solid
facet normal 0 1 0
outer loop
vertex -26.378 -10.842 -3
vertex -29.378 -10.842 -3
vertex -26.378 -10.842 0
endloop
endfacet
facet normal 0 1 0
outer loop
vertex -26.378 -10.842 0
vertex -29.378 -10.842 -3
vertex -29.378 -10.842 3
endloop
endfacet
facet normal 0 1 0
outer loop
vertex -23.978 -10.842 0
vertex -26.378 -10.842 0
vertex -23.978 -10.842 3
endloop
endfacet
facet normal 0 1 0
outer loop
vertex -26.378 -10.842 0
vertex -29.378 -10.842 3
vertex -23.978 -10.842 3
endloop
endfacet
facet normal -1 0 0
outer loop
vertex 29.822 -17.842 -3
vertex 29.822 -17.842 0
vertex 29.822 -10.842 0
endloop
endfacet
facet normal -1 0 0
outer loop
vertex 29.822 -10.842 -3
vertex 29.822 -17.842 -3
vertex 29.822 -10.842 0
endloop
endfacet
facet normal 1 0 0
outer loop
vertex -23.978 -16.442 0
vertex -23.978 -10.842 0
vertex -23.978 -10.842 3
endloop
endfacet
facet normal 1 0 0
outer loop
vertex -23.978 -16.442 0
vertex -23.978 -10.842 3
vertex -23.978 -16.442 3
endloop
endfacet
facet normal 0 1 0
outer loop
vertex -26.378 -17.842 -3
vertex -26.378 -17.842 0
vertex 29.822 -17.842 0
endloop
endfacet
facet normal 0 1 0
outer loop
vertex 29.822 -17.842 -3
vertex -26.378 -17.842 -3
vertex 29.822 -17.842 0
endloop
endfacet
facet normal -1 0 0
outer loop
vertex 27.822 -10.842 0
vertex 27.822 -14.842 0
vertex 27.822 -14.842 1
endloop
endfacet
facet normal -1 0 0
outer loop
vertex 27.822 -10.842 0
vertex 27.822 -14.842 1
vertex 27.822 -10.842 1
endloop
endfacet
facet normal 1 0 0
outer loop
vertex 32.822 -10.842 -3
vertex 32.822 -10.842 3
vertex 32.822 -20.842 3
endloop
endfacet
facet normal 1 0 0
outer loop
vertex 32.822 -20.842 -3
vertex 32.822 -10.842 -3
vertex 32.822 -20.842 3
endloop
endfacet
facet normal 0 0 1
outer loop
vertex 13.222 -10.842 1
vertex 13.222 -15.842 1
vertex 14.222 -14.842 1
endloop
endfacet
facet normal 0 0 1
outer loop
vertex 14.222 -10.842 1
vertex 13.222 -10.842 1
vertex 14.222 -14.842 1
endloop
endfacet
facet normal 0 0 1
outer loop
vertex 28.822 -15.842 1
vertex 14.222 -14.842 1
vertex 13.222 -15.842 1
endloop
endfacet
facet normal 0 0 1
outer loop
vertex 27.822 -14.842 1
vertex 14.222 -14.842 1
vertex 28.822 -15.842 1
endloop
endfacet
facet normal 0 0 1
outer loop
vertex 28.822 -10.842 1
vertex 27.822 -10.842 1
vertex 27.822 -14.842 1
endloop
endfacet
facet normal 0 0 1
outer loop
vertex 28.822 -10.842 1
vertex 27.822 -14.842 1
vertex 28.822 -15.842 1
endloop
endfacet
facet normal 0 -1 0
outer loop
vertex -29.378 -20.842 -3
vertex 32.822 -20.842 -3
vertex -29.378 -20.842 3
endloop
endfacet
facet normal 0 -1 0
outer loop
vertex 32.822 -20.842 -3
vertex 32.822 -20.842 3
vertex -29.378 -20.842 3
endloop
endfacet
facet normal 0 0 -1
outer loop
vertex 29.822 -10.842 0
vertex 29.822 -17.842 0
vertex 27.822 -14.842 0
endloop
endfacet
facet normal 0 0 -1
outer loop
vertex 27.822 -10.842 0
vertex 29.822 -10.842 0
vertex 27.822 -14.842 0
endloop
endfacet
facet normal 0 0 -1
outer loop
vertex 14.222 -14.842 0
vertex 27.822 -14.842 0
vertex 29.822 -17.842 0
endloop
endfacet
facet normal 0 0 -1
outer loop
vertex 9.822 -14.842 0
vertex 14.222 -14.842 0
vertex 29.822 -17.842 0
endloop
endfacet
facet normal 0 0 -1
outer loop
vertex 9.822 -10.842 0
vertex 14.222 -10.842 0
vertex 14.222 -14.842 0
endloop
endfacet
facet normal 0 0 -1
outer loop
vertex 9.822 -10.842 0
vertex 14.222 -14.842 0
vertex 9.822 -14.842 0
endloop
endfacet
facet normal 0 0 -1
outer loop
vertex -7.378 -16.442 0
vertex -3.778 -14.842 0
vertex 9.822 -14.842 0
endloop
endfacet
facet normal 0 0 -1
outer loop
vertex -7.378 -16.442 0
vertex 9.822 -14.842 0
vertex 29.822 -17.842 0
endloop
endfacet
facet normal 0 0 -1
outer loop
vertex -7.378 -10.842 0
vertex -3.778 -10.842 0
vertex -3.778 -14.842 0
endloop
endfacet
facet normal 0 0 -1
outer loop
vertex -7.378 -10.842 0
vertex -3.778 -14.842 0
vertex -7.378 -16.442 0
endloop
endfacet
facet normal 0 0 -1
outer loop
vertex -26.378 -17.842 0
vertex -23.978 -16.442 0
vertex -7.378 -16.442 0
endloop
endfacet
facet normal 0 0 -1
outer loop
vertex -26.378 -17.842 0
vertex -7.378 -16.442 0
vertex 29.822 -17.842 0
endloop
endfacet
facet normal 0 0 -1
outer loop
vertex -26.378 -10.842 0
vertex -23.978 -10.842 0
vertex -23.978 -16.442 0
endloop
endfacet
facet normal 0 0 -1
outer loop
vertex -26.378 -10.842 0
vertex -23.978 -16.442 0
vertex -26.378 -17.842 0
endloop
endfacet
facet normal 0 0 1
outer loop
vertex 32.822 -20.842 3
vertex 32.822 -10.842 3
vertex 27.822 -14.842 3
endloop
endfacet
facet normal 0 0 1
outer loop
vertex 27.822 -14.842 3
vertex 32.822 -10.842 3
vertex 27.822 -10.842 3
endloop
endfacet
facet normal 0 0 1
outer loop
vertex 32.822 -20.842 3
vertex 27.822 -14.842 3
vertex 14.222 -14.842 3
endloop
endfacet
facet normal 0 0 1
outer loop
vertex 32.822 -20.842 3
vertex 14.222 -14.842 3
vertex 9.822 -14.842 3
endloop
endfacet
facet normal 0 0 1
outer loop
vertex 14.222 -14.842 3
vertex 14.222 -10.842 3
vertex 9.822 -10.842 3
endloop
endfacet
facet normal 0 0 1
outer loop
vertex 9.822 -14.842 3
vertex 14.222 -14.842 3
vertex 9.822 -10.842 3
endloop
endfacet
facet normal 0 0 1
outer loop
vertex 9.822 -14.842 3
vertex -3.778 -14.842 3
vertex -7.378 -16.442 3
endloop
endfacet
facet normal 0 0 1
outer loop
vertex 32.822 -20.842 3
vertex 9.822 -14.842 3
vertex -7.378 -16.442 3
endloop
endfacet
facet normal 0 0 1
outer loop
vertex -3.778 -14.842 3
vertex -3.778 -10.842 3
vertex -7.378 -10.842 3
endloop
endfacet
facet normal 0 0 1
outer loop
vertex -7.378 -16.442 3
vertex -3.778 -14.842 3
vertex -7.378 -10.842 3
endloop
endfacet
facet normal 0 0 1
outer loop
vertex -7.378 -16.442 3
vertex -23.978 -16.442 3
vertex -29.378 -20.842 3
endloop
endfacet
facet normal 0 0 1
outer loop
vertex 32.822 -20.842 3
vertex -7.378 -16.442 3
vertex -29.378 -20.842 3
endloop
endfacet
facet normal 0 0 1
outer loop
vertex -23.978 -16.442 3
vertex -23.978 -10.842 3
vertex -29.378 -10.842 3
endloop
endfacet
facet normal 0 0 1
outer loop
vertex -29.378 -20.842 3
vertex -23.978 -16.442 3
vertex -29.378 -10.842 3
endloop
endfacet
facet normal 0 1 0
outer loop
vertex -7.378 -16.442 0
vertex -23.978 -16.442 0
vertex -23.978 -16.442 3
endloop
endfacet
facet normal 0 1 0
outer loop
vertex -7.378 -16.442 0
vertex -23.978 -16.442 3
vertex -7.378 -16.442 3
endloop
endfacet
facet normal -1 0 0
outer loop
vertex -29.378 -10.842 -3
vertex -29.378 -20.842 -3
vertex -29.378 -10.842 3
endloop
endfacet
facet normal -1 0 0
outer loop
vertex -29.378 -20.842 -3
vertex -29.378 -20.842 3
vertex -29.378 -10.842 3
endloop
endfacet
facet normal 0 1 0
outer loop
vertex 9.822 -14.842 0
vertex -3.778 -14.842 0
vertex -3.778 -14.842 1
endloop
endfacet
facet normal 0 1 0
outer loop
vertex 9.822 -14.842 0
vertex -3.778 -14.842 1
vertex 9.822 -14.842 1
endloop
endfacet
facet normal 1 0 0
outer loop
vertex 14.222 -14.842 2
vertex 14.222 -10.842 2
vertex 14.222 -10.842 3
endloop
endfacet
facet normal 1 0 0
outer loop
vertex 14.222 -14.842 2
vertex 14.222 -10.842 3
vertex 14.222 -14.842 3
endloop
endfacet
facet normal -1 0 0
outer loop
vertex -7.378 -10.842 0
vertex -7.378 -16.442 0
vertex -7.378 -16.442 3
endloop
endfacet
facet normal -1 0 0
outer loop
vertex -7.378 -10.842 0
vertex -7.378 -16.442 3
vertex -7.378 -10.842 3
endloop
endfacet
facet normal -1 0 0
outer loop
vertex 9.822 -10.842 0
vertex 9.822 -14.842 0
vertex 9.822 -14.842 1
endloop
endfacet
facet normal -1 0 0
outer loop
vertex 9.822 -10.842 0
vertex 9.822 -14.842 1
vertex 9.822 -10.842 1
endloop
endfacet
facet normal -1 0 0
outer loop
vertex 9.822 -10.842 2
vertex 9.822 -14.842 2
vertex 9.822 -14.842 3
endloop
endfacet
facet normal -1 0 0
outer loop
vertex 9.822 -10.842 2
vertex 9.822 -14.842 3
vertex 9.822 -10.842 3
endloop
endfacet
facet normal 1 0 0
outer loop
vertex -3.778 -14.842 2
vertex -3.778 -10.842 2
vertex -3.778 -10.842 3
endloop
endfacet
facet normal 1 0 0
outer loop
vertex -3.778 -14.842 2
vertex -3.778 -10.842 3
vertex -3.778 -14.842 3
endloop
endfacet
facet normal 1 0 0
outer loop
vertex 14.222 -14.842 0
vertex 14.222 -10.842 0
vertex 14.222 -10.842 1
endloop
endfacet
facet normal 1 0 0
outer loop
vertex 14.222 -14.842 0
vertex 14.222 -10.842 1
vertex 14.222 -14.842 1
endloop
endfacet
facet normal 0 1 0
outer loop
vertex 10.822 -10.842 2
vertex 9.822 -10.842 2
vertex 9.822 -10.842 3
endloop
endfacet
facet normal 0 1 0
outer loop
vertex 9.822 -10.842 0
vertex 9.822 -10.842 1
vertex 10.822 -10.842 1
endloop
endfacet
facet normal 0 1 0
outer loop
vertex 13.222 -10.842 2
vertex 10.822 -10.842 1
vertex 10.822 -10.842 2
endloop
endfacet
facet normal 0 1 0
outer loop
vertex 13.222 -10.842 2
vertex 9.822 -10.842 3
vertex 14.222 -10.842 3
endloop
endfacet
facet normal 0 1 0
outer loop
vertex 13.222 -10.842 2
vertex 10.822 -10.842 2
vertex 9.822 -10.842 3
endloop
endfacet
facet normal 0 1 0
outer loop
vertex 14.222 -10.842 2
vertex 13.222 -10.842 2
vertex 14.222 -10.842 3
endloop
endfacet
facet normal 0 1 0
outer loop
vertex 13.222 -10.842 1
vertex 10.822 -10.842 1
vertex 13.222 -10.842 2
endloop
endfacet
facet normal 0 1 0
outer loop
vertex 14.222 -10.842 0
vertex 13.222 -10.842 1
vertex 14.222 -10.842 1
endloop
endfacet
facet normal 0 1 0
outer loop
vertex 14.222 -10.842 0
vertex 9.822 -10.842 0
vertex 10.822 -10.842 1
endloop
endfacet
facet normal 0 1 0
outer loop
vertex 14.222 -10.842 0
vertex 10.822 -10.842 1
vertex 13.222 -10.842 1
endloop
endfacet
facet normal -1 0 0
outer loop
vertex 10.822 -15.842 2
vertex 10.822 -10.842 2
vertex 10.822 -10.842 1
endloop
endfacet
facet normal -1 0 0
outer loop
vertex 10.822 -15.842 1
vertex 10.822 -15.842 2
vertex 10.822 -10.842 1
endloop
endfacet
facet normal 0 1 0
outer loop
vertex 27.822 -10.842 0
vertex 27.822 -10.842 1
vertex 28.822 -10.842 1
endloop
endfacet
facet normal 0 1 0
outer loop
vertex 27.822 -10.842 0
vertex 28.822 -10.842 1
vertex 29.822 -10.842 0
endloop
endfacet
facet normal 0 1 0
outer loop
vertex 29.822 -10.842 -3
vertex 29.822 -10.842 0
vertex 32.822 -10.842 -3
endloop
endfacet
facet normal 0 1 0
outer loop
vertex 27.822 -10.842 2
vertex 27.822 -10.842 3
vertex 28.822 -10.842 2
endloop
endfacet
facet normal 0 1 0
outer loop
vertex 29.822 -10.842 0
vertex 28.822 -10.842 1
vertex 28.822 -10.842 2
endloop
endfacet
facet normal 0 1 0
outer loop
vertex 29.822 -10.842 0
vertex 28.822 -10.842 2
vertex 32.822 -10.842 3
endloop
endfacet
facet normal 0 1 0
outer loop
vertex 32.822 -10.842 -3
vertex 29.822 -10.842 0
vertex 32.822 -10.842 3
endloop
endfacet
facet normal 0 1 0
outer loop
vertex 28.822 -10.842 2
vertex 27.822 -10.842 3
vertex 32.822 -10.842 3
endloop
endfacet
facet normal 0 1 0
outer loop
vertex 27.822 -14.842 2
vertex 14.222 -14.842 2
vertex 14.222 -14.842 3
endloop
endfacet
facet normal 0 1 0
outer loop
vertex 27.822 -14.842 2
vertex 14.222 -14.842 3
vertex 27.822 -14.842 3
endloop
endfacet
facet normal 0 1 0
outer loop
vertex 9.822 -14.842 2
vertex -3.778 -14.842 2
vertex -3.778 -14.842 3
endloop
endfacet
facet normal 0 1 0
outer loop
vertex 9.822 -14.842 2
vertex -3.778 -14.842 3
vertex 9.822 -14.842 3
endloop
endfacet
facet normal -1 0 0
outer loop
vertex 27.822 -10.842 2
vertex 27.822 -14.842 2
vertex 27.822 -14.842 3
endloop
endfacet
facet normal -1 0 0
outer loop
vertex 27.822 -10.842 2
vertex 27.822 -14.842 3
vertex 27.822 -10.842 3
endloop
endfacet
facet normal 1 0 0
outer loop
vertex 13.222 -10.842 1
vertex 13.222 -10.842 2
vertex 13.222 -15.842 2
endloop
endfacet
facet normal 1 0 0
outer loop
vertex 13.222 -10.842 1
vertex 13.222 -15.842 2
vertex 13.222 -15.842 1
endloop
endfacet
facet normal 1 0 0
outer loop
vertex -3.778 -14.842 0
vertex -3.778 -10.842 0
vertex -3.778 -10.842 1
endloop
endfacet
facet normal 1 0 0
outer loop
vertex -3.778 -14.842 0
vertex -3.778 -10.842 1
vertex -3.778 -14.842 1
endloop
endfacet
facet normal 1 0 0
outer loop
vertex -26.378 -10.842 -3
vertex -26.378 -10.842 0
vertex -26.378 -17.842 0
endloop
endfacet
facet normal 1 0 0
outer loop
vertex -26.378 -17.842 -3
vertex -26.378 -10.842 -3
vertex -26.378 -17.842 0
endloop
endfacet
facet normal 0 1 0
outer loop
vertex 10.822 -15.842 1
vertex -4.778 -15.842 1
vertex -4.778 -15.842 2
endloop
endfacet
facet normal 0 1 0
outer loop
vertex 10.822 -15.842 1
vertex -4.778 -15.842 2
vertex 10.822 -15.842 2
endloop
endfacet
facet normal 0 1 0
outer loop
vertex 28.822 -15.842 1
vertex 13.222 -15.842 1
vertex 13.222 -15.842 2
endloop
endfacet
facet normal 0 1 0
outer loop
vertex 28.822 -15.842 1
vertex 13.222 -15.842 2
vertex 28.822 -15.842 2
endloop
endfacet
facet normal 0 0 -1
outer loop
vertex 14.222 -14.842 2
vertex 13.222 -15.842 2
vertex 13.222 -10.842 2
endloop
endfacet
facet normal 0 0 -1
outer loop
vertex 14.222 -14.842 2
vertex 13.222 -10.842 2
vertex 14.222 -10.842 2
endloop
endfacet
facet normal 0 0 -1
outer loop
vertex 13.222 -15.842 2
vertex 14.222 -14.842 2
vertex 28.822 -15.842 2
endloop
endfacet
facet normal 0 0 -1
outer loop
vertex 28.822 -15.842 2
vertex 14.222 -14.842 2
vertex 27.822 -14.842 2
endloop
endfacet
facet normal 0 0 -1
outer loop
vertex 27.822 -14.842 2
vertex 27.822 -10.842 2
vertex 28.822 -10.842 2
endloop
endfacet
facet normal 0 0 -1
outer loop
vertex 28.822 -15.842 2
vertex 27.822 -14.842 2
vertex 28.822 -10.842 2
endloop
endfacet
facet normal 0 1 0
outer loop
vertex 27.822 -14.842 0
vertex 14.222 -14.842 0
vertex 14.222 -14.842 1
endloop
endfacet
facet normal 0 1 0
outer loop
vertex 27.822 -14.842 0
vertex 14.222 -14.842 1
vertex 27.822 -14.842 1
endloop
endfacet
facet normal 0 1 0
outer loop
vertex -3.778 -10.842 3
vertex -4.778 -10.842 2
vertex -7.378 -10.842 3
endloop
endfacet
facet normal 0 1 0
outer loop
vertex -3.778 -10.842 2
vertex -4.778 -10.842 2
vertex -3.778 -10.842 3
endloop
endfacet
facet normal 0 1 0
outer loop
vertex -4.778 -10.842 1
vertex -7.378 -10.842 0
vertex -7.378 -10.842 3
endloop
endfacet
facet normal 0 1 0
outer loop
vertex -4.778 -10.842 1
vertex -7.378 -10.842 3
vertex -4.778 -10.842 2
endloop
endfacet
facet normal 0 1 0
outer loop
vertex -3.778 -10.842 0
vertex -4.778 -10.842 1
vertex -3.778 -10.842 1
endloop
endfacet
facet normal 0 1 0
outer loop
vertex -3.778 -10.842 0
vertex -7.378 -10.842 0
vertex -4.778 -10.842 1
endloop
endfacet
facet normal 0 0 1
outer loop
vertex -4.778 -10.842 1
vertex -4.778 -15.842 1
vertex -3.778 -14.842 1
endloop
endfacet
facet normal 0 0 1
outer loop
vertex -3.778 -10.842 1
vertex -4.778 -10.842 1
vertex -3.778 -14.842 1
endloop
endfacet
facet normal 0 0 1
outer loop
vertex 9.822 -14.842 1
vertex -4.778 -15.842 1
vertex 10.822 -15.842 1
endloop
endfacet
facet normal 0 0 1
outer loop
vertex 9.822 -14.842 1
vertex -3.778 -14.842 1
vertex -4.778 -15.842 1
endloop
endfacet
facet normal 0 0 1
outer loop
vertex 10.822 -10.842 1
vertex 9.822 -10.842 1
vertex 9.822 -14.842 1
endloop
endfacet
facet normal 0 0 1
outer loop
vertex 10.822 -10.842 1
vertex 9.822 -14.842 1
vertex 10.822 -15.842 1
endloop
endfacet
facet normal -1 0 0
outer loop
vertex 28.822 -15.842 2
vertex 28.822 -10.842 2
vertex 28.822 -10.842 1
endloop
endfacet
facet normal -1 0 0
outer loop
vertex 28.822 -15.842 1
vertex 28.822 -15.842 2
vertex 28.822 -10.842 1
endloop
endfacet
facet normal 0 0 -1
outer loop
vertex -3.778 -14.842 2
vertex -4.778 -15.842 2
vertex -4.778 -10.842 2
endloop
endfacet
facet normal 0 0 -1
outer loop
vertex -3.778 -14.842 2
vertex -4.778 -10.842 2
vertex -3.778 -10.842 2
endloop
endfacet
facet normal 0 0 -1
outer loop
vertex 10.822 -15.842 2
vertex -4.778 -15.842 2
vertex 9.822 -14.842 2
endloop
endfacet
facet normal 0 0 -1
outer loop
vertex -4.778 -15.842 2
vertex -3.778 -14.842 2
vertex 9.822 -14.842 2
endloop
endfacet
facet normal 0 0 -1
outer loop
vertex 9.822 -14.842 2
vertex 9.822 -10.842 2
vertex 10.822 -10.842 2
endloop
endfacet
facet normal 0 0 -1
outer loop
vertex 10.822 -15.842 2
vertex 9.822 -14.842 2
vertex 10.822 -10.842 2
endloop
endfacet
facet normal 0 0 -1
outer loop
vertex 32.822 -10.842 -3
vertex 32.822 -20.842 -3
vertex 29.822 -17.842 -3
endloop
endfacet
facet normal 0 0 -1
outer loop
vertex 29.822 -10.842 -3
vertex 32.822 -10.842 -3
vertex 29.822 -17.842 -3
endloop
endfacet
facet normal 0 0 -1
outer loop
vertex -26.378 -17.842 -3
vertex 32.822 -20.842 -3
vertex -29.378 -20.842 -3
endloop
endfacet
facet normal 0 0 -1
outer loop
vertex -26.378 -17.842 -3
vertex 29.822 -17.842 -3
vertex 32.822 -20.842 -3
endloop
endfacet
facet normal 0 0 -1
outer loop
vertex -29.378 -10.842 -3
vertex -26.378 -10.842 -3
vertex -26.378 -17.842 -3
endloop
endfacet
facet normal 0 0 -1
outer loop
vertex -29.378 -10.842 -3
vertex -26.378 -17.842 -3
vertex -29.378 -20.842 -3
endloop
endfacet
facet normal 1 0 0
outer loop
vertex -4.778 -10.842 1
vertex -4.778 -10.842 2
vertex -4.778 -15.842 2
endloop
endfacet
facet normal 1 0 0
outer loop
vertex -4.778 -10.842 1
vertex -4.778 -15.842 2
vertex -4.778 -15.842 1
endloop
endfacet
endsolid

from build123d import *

# Parameters (mm, degrees)
BOSS_EXTRUDE1_DEPTH = 3
SKETCH4_W           = 15.6
SKETCH4_H           = 1
CUT_EXTRUDE1_DEPTH  = 5
BOSS_EXTRUDE3_DEPTH = 3


with BuildPart() as part:
    # Sketch1 → Boss-Extrude1 (new body)
    with BuildSketch(Plane.XY):
        Polygon((29.821727019, -20.842278002), (-26.378272981, -20.842278002), (-29.378272981, -20.842278002), (-29.378272981, -10.842278002), (-26.378272981, -10.842278002), (-23.978272981, -10.842278002), (-23.978272981, -16.442278002), (-7.378272981, -16.442278002), (-7.378272981, -10.842278002), (-3.778272981, -10.842278002), (-3.778272981, -14.842278002), (9.821727019, -14.842278002), (9.821727019, -10.842278002), (14.221727019, -10.842278002), (14.221727019, -14.842278002), (27.821727019, -14.842278002), (27.821727019, -10.842278002), (29.821727019, -10.842278002), (32.821727019, -10.842278002), (32.821727019, -20.842278002), align=None)
    extrude(amount=BOSS_EXTRUDE1_DEPTH)

    # Sketch4 → Cut-Extrude1 (cut)
    with BuildSketch(Plane(origin=(0, -10.842278002, 0), x_dir=(1, 0, 0), z_dir=(0, 1, 0))):
        with Locations((3.021727019, -1.5)):
            Rectangle(SKETCH4_W, SKETCH4_H)
        with Locations((21.021727019, -1.5)):
            Rectangle(SKETCH4_W, SKETCH4_H)
    extrude(amount=-CUT_EXTRUDE1_DEPTH, mode=Mode.SUBTRACT)

    # Sketch5 → Boss-Extrude3 (add)
    with BuildSketch(Plane(origin=(0, 0, 0), x_dir=(-1, 0, 0), z_dir=(0, 0, -1))):
        Polygon((-32.821727019, -10.842278002), (-32.821727019, -20.842278002), (29.378272981, -20.842278002), (29.378272981, -10.842278002), (26.378272981, -10.842278002), (26.378272981, -17.842278002), (-29.821727019, -17.842278002), (-29.821727019, -10.842278002), align=None)
    extrude(amount=BOSS_EXTRUDE3_DEPTH)


solid = part.part
